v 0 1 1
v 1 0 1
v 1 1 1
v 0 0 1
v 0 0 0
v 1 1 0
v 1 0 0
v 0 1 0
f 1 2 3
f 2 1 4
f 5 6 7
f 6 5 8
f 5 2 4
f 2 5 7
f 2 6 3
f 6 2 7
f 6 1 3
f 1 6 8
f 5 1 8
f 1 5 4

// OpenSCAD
/* [Sliders] */
// A full slider
slider = 10; // [0:0.5:20]
// Min and max only
range = 5; // [0:10]
// Max only
max_only = 3; // [10]
/* [Choices] */
num_choice = 2; // [1, 2, 3]
labelled = 10; // [10:Small, 20:Medium, 30:Large]
str_choice = "a"; // [a:Apple, b:Banana]
/* [Other] */
text = "hello"; // 8
flag = false;
vec2 = [1, 2];
vec3 = [1, 2, 3]; // [0:1:10]
spin = 1.5;
/* [Hidden] */
secret = 7;

echo(slider = slider, range = range, max_only = max_only, num_choice = num_choice, labelled = labelled,
     str_choice = str_choice, text = text, flag = flag, vec2 = vec2, vec3 = vec3, spin = spin);
cube(1);
